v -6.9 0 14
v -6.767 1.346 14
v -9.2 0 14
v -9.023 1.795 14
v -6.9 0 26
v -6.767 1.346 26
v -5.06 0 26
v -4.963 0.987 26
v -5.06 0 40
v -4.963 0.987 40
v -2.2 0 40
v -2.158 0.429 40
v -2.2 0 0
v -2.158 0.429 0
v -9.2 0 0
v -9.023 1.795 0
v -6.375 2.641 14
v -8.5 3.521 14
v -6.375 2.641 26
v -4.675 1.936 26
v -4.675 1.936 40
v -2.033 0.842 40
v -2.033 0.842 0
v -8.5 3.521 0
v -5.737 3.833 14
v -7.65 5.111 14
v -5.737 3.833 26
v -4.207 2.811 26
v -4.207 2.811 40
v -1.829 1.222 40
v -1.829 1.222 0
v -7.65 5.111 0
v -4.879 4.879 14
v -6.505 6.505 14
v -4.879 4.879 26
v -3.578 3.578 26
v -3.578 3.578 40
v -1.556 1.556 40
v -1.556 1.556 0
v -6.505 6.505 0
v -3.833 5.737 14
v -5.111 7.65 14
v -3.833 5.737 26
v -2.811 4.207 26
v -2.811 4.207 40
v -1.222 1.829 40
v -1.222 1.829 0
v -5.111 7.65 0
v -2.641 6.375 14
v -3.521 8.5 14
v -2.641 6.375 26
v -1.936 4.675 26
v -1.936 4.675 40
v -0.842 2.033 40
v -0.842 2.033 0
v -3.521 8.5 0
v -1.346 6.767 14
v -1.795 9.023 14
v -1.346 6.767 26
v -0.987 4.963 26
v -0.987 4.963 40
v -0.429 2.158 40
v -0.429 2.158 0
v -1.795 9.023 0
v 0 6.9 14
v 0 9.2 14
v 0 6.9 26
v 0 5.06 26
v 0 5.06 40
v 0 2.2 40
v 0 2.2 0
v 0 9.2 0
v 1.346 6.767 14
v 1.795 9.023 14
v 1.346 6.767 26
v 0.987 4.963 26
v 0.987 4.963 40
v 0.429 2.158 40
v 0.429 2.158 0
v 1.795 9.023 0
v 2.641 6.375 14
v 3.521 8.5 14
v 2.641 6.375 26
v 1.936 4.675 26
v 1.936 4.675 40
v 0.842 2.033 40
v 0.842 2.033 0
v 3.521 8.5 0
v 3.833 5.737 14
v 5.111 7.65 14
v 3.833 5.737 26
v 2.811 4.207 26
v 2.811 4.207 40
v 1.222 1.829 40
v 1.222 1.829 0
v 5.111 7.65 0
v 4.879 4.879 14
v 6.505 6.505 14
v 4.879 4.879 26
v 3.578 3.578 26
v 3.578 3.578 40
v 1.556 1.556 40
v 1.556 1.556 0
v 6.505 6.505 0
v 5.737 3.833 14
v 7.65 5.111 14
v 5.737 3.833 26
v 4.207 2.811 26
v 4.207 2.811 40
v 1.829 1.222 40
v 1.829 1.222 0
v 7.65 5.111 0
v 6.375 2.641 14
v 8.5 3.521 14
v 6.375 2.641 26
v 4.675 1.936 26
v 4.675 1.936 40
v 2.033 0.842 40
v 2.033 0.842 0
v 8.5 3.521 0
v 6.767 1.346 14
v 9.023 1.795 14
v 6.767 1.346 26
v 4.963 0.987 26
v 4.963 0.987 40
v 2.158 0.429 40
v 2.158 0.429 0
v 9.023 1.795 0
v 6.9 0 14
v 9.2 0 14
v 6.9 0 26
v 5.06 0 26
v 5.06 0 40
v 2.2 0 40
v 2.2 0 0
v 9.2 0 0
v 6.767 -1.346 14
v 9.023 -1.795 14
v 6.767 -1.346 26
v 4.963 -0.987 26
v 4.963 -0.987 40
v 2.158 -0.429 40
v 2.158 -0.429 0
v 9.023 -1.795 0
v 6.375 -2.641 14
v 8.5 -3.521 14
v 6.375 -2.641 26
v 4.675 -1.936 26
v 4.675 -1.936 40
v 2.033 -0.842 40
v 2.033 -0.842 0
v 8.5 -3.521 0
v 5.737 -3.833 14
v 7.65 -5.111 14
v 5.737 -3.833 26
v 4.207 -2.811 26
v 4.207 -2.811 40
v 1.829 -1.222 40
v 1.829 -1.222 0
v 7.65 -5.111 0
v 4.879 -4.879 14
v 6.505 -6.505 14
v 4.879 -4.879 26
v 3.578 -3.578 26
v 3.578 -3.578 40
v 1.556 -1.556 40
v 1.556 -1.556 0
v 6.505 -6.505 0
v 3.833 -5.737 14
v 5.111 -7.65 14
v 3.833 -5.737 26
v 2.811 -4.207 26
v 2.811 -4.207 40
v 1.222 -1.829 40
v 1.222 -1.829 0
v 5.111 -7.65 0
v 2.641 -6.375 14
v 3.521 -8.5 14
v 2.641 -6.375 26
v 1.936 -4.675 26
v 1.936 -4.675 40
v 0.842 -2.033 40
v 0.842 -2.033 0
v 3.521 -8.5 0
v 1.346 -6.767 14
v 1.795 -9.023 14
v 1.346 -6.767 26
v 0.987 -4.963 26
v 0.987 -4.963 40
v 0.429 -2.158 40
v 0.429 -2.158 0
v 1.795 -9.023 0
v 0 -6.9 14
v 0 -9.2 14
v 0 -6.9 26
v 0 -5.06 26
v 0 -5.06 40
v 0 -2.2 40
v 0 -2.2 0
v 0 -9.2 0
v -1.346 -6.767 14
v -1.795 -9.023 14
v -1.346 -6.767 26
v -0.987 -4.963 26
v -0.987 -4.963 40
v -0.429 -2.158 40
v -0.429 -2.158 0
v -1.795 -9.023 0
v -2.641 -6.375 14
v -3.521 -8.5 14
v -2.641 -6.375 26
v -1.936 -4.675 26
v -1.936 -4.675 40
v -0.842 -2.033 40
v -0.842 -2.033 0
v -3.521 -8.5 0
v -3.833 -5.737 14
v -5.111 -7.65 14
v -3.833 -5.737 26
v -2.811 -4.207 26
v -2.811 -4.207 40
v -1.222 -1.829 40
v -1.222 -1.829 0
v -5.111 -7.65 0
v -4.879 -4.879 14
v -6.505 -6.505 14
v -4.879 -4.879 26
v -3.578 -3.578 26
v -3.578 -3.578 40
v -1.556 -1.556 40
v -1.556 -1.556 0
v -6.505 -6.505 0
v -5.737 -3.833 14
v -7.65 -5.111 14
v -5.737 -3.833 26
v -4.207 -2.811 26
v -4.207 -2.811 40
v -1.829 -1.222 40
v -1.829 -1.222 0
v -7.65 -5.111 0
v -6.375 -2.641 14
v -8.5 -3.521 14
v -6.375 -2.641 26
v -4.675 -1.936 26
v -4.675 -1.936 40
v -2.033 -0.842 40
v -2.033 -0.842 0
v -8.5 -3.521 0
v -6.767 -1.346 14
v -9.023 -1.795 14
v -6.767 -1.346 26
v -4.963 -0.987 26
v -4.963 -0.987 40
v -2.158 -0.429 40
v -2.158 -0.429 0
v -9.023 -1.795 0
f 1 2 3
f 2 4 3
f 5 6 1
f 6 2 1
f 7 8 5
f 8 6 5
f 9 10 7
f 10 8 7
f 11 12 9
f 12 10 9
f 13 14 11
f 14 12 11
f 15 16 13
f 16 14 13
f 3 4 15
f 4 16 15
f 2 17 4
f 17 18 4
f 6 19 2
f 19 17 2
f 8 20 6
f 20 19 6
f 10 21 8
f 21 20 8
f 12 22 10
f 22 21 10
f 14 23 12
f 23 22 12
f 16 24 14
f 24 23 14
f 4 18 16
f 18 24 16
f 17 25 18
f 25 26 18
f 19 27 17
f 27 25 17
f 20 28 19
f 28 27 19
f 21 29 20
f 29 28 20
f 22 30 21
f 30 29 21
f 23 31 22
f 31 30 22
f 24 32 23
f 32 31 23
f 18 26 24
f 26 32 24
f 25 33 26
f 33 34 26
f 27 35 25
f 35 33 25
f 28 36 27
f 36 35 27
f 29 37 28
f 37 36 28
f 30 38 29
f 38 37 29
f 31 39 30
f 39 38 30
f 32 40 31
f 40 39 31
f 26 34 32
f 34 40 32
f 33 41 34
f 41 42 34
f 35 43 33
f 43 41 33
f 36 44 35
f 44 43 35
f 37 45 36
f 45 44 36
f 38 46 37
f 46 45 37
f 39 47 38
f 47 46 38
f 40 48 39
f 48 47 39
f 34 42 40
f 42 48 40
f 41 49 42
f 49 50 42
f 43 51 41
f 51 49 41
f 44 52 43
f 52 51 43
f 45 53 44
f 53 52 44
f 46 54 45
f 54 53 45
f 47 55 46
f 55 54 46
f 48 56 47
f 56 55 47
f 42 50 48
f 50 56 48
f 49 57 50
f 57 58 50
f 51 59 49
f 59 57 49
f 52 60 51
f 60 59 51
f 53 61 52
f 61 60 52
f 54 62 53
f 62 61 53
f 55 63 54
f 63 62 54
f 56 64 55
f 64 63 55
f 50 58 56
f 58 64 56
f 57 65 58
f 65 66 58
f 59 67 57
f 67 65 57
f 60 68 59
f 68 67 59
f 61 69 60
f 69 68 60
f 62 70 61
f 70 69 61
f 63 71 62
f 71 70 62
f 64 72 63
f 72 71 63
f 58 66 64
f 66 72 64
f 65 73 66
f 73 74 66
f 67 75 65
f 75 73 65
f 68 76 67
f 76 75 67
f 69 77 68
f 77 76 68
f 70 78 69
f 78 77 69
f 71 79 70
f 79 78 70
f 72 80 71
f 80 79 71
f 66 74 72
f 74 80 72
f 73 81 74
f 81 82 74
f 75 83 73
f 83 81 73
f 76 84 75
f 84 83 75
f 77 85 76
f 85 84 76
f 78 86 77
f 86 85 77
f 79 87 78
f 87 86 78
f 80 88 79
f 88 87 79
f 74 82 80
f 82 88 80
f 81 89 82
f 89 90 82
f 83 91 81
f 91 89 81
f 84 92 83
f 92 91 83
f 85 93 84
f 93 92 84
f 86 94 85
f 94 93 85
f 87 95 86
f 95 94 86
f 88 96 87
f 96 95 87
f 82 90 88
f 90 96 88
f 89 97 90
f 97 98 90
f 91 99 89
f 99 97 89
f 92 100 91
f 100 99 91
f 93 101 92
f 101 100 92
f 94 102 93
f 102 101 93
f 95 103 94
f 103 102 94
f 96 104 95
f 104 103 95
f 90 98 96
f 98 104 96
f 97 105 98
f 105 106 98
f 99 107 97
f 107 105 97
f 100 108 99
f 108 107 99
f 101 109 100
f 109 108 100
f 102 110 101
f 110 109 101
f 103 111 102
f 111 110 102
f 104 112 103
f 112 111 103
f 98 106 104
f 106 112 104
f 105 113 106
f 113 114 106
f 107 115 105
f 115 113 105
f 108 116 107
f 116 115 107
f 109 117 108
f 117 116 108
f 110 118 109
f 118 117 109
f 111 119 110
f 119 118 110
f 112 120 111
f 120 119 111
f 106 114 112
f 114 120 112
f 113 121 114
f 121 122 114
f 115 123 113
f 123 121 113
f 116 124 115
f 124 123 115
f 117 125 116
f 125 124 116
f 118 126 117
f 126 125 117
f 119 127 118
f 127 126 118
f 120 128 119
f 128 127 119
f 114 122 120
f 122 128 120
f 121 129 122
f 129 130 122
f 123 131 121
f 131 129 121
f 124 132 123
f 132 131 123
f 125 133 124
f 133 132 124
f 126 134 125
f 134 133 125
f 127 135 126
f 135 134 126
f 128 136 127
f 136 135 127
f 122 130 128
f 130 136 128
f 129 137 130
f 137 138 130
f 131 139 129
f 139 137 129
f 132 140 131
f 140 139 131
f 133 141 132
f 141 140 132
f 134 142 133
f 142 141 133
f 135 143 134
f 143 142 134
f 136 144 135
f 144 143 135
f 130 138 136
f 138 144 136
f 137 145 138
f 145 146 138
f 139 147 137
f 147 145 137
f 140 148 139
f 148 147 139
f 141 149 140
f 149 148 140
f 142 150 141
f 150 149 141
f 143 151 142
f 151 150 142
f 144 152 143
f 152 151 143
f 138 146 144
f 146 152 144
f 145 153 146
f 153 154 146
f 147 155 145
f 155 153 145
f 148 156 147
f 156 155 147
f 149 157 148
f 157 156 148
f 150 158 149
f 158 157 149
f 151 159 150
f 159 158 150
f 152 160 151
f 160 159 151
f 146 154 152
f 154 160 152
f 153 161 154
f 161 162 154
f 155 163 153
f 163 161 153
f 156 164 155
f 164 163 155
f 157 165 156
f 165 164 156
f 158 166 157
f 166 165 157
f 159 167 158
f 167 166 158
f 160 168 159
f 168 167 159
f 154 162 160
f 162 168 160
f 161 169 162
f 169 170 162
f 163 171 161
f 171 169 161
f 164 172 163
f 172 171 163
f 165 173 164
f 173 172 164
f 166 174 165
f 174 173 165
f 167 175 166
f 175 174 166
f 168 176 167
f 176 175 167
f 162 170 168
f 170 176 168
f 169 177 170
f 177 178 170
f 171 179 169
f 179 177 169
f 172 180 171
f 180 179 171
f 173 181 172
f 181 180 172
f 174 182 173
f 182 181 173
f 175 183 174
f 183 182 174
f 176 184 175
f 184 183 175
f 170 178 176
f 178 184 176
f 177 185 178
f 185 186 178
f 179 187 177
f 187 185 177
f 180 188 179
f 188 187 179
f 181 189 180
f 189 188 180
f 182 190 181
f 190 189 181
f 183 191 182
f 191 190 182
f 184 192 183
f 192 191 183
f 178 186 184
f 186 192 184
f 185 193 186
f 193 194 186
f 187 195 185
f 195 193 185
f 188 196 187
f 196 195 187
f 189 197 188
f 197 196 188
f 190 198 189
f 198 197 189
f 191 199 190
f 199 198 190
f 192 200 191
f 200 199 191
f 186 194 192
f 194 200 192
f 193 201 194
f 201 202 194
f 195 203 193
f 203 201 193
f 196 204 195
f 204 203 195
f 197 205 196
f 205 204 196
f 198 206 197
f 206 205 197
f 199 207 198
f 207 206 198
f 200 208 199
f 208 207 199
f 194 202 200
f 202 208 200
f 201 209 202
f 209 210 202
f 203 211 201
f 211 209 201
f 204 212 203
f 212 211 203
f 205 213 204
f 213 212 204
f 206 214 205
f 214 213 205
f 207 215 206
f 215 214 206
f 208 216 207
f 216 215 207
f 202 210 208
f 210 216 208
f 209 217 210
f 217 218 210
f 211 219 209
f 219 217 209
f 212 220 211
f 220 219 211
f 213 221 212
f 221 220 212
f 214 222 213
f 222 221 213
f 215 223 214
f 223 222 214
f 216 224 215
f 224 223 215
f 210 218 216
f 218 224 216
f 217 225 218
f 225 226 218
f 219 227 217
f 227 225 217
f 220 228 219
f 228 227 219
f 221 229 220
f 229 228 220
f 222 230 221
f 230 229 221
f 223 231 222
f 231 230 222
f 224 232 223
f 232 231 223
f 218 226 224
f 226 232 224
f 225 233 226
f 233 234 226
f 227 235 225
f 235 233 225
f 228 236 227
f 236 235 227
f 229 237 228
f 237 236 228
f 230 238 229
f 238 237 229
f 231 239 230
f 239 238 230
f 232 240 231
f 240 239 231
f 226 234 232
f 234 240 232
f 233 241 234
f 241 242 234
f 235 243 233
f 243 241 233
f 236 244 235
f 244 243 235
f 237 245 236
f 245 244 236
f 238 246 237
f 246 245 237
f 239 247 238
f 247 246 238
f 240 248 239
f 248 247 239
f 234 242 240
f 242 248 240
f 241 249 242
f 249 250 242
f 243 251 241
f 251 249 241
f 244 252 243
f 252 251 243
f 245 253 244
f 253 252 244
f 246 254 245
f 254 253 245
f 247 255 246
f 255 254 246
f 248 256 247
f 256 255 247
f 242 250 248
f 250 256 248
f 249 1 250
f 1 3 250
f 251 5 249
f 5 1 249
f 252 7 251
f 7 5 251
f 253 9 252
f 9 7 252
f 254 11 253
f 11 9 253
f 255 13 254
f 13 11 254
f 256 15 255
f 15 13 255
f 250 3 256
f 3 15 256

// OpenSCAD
$fn = 32;

// ----------------------------------------------------------------------
// Profiled standoff: stepped spacer, 40 mm long, bore 4.4 mm
// ----------------------------------------------------------------------

// --- parameters (mm) ---
revolve_angle = 360;      // full turn around the Z axis
profile_points = 8;       // points of the closed outline

profile = [[2.2, 0], [9.2, 0], [9.2, 14], [6.9, 14], [6.9, 26], [5.06, 26], [5.06, 40], [2.2, 40]];  // single closed polygon, 8 points, counter clockwise

// --- the one profile operation ---
rotate_extrude(angle = revolve_angle) polygon(points = profile);
